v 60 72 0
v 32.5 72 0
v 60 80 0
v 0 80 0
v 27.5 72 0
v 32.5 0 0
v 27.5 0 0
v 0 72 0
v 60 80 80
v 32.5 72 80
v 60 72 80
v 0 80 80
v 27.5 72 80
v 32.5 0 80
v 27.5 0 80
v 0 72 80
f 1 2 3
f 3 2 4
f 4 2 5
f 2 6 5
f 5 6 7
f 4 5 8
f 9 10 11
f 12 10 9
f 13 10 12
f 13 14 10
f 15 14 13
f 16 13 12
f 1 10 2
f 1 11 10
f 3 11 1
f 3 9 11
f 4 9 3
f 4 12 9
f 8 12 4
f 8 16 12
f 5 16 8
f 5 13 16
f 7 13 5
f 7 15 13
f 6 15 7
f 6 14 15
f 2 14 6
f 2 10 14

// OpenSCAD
$fn = 32;

// ----------------------------------------------------------------------
// Structural section: tee 60 x 80 mm
// ----------------------------------------------------------------------

// --- parameters (mm) ---
sec_w = 60;               // tee width, X
sec_h = 80;               // tee height, Y
flange_t = 8;             // top flange thickness
web_t = 5;                // web thickness
plate_t = 80;             // cut length, Z (extrusion height)

profile = [[27.5, 0], [32.5, 0], [32.5, 72], [60, 72], [60, 80], [0, 80], [0, 72], [27.5, 72]];  // primary outline, 8 points, counter clockwise

// --- the one profile operation ---
linear_extrude(height = plate_t) polygon(points = profile);
